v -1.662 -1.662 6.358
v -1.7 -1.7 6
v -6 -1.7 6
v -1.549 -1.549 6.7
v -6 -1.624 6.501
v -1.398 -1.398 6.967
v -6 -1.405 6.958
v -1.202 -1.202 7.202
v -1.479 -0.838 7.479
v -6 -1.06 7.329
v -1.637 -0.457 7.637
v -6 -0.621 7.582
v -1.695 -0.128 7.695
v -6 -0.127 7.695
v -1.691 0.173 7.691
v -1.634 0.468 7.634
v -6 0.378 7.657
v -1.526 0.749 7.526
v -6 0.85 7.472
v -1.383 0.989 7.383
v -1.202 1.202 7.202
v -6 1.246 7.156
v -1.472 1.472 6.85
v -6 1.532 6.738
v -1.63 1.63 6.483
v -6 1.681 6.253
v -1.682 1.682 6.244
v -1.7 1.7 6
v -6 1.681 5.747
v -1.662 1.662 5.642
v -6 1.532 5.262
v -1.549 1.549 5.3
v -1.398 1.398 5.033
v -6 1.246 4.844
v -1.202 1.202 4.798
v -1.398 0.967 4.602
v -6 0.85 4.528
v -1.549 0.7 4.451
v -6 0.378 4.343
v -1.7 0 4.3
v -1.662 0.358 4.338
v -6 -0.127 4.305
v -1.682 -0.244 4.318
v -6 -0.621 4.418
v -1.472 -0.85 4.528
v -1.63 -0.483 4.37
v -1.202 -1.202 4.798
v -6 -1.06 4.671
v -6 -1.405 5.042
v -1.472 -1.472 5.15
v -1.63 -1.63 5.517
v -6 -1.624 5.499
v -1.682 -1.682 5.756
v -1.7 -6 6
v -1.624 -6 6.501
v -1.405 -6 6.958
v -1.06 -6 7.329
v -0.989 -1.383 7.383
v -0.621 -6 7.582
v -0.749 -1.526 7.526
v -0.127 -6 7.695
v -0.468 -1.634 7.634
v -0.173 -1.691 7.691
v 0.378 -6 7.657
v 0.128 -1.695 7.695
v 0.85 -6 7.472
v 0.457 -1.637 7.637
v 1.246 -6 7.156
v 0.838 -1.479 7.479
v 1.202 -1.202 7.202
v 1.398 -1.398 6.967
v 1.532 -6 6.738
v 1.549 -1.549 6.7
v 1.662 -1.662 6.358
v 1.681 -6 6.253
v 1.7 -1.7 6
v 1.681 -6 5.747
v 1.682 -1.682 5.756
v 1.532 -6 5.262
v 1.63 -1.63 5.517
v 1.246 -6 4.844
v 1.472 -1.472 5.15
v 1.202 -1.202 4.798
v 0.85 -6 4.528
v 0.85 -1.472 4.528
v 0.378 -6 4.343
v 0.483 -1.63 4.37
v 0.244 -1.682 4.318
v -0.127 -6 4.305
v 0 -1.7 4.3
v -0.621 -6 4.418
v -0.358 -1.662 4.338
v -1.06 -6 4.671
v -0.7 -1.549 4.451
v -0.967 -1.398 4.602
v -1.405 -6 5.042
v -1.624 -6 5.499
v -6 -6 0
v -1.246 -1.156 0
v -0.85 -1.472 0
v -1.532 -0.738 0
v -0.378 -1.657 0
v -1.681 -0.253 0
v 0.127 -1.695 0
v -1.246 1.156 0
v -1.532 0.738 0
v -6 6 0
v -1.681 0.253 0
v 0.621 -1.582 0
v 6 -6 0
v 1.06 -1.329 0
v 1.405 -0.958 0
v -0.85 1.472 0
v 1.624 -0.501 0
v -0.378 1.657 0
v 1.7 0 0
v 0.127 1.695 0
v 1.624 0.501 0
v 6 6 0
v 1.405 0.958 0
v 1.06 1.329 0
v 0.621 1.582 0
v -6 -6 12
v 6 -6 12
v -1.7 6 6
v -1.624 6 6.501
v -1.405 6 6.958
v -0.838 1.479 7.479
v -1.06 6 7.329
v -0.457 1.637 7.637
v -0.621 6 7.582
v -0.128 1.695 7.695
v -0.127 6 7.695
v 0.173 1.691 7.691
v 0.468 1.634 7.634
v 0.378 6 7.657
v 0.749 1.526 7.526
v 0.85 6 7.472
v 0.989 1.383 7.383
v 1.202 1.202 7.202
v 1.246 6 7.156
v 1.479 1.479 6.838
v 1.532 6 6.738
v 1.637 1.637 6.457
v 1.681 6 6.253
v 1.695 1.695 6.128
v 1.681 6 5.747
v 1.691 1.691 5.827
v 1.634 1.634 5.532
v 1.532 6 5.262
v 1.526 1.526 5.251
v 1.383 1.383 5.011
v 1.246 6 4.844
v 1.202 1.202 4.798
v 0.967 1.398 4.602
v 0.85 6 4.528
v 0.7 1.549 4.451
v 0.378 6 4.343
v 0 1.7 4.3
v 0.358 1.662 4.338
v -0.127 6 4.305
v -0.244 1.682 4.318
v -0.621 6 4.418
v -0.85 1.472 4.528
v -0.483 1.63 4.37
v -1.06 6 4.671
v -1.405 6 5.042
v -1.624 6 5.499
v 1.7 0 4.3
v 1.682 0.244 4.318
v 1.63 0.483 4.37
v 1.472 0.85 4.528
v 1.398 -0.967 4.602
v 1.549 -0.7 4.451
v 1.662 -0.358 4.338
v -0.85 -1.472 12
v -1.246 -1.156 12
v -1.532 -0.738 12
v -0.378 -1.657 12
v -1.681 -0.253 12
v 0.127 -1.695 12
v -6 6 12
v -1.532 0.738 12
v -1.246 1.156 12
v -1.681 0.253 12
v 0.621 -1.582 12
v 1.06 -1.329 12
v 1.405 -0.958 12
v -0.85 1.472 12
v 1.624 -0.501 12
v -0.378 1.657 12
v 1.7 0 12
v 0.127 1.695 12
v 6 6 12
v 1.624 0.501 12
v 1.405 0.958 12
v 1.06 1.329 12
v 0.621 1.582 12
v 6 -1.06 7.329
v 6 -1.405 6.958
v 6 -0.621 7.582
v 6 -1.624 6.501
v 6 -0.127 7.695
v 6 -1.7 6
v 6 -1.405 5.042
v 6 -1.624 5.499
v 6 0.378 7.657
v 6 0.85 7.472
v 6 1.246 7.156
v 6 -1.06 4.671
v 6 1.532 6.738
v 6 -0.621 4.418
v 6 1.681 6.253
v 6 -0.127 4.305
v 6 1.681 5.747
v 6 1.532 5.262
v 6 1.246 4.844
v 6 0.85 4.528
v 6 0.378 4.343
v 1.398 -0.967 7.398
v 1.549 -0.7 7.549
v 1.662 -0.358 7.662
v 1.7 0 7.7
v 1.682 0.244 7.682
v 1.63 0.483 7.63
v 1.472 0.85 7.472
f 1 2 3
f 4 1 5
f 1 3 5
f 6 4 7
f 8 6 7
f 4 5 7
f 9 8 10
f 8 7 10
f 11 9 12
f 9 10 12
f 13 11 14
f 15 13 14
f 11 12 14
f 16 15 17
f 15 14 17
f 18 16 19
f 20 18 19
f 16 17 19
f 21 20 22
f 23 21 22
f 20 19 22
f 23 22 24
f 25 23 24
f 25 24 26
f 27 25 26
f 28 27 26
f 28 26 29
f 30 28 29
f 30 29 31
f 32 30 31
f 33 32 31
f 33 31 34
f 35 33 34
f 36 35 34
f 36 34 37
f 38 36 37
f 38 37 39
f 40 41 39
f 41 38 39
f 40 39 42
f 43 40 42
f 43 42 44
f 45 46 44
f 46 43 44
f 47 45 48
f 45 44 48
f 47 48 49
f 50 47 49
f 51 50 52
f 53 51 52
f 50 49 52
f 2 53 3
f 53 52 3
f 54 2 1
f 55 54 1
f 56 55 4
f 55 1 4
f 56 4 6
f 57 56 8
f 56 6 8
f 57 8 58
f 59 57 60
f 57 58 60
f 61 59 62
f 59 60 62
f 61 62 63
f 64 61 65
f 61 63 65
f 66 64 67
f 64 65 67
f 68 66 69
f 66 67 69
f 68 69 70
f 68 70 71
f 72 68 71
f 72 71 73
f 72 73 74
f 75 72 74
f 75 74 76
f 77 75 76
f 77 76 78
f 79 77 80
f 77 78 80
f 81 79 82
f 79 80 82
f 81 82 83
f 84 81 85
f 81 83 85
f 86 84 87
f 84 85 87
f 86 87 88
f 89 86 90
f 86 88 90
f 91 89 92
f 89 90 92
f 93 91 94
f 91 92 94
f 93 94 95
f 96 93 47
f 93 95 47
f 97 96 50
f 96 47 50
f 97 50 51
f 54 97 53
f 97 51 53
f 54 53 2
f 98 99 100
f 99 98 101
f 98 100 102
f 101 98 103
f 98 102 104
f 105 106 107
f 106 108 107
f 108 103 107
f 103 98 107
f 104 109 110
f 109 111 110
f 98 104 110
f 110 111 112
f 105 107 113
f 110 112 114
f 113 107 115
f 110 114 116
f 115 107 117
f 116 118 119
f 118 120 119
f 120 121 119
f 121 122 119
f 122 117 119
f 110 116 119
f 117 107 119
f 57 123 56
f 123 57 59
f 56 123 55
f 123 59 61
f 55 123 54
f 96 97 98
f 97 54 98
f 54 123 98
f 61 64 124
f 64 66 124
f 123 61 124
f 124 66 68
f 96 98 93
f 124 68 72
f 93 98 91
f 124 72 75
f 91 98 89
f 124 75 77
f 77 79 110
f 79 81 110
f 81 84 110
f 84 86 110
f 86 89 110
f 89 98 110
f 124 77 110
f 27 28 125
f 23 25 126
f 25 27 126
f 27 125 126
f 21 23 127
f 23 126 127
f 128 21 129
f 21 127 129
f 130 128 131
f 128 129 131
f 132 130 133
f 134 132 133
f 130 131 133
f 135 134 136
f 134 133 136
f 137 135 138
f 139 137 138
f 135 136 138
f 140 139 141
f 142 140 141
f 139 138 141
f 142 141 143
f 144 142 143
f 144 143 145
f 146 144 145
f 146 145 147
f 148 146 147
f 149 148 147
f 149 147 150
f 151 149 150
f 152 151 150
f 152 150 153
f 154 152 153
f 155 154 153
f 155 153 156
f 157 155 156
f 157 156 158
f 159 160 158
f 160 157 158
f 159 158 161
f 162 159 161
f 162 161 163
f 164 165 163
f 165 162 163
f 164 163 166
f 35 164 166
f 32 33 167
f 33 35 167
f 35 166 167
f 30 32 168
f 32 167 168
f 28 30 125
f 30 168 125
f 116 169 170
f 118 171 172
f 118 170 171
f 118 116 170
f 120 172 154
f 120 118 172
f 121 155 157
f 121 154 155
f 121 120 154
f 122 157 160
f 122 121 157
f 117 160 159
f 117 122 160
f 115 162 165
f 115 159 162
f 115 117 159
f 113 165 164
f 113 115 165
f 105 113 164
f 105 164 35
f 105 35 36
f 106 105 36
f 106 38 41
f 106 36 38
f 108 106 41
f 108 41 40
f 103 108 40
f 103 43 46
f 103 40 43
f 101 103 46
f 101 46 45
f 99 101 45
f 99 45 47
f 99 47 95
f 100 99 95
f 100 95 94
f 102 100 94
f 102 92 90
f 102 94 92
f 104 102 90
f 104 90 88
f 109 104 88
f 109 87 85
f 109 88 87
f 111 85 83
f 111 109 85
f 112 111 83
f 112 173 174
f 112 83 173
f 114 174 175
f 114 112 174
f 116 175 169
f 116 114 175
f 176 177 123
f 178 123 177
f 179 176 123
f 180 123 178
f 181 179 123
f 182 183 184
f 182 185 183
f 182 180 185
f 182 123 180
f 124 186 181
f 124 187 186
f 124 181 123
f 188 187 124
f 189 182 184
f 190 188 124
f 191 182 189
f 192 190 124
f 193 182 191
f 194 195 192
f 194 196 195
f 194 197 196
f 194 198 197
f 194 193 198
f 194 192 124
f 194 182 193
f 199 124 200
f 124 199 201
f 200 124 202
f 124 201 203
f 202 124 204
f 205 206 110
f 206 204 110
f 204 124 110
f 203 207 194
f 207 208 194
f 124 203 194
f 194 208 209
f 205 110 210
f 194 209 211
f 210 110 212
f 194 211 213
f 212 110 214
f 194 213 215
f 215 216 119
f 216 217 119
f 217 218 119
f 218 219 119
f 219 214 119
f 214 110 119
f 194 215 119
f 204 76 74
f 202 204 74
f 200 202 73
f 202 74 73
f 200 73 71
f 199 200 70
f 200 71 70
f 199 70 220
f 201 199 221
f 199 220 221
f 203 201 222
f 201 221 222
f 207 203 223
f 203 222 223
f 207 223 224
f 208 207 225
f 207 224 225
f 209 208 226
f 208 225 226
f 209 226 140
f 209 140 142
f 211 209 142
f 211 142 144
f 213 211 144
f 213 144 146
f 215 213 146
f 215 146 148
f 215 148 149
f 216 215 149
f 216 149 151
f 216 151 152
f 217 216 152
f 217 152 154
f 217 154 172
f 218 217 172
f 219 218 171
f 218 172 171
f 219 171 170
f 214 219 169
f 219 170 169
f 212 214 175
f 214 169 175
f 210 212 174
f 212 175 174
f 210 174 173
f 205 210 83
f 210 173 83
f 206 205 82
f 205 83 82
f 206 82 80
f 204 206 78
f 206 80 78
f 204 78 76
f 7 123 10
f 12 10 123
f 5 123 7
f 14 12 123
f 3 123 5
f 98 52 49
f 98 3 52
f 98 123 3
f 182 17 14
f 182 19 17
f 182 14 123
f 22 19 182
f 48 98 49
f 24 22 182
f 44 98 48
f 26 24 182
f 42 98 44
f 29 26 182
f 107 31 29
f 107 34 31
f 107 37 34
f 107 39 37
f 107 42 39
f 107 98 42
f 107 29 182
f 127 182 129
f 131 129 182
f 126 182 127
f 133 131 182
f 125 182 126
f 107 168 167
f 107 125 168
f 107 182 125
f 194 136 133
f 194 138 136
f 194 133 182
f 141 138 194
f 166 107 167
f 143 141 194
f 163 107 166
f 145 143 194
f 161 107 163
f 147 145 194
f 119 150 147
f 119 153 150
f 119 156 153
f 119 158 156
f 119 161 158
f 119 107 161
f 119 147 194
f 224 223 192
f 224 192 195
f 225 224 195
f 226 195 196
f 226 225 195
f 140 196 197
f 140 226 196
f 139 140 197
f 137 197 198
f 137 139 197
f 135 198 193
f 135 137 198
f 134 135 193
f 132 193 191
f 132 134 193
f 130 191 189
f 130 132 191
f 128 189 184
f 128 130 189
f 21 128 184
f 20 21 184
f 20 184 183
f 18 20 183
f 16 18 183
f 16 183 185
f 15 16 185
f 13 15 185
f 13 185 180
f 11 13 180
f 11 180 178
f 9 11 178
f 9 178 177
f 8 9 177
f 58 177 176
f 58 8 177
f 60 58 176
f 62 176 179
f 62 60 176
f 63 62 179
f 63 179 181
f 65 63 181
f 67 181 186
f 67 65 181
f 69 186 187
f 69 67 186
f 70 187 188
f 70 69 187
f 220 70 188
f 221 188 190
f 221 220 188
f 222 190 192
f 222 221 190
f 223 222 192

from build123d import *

# Parameters (mm, degrees)
F0_W     = 12
F0_H     = 12
F0_R     = 1.7
F1_DEPTH = 12
F2_R     = 1.7
F3_DEPTH = 12
F4_R     = 1.7
F5_DEPTH = 12


with BuildPart() as f1:
    # F0 (on Top) → F1 (new body)
    with BuildSketch(Plane.XY):
        Rectangle(F0_W, F0_H)
        Circle(F0_R, mode=Mode.SUBTRACT)
    extrude(amount=F1_DEPTH)

    # F2 (on face) → F3 (cut)
    with BuildSketch(Plane(origin=(-6, 0, 0), x_dir=(0, -1, 0), z_dir=(-1, 0, 0))):
        with Locations((0, 6)):
            Circle(F2_R)
    extrude(amount=-F3_DEPTH, mode=Mode.SUBTRACT)

    # F4 (on face) → F5 (cut)
    with BuildSketch(Plane(origin=(0, 6, 0), x_dir=(-1, 0, 0), z_dir=(0, 1, 0))):
        with Locations((0, 6)):
            Circle(F4_R)
    extrude(amount=-F5_DEPTH, mode=Mode.SUBTRACT)


solid = f1.part
